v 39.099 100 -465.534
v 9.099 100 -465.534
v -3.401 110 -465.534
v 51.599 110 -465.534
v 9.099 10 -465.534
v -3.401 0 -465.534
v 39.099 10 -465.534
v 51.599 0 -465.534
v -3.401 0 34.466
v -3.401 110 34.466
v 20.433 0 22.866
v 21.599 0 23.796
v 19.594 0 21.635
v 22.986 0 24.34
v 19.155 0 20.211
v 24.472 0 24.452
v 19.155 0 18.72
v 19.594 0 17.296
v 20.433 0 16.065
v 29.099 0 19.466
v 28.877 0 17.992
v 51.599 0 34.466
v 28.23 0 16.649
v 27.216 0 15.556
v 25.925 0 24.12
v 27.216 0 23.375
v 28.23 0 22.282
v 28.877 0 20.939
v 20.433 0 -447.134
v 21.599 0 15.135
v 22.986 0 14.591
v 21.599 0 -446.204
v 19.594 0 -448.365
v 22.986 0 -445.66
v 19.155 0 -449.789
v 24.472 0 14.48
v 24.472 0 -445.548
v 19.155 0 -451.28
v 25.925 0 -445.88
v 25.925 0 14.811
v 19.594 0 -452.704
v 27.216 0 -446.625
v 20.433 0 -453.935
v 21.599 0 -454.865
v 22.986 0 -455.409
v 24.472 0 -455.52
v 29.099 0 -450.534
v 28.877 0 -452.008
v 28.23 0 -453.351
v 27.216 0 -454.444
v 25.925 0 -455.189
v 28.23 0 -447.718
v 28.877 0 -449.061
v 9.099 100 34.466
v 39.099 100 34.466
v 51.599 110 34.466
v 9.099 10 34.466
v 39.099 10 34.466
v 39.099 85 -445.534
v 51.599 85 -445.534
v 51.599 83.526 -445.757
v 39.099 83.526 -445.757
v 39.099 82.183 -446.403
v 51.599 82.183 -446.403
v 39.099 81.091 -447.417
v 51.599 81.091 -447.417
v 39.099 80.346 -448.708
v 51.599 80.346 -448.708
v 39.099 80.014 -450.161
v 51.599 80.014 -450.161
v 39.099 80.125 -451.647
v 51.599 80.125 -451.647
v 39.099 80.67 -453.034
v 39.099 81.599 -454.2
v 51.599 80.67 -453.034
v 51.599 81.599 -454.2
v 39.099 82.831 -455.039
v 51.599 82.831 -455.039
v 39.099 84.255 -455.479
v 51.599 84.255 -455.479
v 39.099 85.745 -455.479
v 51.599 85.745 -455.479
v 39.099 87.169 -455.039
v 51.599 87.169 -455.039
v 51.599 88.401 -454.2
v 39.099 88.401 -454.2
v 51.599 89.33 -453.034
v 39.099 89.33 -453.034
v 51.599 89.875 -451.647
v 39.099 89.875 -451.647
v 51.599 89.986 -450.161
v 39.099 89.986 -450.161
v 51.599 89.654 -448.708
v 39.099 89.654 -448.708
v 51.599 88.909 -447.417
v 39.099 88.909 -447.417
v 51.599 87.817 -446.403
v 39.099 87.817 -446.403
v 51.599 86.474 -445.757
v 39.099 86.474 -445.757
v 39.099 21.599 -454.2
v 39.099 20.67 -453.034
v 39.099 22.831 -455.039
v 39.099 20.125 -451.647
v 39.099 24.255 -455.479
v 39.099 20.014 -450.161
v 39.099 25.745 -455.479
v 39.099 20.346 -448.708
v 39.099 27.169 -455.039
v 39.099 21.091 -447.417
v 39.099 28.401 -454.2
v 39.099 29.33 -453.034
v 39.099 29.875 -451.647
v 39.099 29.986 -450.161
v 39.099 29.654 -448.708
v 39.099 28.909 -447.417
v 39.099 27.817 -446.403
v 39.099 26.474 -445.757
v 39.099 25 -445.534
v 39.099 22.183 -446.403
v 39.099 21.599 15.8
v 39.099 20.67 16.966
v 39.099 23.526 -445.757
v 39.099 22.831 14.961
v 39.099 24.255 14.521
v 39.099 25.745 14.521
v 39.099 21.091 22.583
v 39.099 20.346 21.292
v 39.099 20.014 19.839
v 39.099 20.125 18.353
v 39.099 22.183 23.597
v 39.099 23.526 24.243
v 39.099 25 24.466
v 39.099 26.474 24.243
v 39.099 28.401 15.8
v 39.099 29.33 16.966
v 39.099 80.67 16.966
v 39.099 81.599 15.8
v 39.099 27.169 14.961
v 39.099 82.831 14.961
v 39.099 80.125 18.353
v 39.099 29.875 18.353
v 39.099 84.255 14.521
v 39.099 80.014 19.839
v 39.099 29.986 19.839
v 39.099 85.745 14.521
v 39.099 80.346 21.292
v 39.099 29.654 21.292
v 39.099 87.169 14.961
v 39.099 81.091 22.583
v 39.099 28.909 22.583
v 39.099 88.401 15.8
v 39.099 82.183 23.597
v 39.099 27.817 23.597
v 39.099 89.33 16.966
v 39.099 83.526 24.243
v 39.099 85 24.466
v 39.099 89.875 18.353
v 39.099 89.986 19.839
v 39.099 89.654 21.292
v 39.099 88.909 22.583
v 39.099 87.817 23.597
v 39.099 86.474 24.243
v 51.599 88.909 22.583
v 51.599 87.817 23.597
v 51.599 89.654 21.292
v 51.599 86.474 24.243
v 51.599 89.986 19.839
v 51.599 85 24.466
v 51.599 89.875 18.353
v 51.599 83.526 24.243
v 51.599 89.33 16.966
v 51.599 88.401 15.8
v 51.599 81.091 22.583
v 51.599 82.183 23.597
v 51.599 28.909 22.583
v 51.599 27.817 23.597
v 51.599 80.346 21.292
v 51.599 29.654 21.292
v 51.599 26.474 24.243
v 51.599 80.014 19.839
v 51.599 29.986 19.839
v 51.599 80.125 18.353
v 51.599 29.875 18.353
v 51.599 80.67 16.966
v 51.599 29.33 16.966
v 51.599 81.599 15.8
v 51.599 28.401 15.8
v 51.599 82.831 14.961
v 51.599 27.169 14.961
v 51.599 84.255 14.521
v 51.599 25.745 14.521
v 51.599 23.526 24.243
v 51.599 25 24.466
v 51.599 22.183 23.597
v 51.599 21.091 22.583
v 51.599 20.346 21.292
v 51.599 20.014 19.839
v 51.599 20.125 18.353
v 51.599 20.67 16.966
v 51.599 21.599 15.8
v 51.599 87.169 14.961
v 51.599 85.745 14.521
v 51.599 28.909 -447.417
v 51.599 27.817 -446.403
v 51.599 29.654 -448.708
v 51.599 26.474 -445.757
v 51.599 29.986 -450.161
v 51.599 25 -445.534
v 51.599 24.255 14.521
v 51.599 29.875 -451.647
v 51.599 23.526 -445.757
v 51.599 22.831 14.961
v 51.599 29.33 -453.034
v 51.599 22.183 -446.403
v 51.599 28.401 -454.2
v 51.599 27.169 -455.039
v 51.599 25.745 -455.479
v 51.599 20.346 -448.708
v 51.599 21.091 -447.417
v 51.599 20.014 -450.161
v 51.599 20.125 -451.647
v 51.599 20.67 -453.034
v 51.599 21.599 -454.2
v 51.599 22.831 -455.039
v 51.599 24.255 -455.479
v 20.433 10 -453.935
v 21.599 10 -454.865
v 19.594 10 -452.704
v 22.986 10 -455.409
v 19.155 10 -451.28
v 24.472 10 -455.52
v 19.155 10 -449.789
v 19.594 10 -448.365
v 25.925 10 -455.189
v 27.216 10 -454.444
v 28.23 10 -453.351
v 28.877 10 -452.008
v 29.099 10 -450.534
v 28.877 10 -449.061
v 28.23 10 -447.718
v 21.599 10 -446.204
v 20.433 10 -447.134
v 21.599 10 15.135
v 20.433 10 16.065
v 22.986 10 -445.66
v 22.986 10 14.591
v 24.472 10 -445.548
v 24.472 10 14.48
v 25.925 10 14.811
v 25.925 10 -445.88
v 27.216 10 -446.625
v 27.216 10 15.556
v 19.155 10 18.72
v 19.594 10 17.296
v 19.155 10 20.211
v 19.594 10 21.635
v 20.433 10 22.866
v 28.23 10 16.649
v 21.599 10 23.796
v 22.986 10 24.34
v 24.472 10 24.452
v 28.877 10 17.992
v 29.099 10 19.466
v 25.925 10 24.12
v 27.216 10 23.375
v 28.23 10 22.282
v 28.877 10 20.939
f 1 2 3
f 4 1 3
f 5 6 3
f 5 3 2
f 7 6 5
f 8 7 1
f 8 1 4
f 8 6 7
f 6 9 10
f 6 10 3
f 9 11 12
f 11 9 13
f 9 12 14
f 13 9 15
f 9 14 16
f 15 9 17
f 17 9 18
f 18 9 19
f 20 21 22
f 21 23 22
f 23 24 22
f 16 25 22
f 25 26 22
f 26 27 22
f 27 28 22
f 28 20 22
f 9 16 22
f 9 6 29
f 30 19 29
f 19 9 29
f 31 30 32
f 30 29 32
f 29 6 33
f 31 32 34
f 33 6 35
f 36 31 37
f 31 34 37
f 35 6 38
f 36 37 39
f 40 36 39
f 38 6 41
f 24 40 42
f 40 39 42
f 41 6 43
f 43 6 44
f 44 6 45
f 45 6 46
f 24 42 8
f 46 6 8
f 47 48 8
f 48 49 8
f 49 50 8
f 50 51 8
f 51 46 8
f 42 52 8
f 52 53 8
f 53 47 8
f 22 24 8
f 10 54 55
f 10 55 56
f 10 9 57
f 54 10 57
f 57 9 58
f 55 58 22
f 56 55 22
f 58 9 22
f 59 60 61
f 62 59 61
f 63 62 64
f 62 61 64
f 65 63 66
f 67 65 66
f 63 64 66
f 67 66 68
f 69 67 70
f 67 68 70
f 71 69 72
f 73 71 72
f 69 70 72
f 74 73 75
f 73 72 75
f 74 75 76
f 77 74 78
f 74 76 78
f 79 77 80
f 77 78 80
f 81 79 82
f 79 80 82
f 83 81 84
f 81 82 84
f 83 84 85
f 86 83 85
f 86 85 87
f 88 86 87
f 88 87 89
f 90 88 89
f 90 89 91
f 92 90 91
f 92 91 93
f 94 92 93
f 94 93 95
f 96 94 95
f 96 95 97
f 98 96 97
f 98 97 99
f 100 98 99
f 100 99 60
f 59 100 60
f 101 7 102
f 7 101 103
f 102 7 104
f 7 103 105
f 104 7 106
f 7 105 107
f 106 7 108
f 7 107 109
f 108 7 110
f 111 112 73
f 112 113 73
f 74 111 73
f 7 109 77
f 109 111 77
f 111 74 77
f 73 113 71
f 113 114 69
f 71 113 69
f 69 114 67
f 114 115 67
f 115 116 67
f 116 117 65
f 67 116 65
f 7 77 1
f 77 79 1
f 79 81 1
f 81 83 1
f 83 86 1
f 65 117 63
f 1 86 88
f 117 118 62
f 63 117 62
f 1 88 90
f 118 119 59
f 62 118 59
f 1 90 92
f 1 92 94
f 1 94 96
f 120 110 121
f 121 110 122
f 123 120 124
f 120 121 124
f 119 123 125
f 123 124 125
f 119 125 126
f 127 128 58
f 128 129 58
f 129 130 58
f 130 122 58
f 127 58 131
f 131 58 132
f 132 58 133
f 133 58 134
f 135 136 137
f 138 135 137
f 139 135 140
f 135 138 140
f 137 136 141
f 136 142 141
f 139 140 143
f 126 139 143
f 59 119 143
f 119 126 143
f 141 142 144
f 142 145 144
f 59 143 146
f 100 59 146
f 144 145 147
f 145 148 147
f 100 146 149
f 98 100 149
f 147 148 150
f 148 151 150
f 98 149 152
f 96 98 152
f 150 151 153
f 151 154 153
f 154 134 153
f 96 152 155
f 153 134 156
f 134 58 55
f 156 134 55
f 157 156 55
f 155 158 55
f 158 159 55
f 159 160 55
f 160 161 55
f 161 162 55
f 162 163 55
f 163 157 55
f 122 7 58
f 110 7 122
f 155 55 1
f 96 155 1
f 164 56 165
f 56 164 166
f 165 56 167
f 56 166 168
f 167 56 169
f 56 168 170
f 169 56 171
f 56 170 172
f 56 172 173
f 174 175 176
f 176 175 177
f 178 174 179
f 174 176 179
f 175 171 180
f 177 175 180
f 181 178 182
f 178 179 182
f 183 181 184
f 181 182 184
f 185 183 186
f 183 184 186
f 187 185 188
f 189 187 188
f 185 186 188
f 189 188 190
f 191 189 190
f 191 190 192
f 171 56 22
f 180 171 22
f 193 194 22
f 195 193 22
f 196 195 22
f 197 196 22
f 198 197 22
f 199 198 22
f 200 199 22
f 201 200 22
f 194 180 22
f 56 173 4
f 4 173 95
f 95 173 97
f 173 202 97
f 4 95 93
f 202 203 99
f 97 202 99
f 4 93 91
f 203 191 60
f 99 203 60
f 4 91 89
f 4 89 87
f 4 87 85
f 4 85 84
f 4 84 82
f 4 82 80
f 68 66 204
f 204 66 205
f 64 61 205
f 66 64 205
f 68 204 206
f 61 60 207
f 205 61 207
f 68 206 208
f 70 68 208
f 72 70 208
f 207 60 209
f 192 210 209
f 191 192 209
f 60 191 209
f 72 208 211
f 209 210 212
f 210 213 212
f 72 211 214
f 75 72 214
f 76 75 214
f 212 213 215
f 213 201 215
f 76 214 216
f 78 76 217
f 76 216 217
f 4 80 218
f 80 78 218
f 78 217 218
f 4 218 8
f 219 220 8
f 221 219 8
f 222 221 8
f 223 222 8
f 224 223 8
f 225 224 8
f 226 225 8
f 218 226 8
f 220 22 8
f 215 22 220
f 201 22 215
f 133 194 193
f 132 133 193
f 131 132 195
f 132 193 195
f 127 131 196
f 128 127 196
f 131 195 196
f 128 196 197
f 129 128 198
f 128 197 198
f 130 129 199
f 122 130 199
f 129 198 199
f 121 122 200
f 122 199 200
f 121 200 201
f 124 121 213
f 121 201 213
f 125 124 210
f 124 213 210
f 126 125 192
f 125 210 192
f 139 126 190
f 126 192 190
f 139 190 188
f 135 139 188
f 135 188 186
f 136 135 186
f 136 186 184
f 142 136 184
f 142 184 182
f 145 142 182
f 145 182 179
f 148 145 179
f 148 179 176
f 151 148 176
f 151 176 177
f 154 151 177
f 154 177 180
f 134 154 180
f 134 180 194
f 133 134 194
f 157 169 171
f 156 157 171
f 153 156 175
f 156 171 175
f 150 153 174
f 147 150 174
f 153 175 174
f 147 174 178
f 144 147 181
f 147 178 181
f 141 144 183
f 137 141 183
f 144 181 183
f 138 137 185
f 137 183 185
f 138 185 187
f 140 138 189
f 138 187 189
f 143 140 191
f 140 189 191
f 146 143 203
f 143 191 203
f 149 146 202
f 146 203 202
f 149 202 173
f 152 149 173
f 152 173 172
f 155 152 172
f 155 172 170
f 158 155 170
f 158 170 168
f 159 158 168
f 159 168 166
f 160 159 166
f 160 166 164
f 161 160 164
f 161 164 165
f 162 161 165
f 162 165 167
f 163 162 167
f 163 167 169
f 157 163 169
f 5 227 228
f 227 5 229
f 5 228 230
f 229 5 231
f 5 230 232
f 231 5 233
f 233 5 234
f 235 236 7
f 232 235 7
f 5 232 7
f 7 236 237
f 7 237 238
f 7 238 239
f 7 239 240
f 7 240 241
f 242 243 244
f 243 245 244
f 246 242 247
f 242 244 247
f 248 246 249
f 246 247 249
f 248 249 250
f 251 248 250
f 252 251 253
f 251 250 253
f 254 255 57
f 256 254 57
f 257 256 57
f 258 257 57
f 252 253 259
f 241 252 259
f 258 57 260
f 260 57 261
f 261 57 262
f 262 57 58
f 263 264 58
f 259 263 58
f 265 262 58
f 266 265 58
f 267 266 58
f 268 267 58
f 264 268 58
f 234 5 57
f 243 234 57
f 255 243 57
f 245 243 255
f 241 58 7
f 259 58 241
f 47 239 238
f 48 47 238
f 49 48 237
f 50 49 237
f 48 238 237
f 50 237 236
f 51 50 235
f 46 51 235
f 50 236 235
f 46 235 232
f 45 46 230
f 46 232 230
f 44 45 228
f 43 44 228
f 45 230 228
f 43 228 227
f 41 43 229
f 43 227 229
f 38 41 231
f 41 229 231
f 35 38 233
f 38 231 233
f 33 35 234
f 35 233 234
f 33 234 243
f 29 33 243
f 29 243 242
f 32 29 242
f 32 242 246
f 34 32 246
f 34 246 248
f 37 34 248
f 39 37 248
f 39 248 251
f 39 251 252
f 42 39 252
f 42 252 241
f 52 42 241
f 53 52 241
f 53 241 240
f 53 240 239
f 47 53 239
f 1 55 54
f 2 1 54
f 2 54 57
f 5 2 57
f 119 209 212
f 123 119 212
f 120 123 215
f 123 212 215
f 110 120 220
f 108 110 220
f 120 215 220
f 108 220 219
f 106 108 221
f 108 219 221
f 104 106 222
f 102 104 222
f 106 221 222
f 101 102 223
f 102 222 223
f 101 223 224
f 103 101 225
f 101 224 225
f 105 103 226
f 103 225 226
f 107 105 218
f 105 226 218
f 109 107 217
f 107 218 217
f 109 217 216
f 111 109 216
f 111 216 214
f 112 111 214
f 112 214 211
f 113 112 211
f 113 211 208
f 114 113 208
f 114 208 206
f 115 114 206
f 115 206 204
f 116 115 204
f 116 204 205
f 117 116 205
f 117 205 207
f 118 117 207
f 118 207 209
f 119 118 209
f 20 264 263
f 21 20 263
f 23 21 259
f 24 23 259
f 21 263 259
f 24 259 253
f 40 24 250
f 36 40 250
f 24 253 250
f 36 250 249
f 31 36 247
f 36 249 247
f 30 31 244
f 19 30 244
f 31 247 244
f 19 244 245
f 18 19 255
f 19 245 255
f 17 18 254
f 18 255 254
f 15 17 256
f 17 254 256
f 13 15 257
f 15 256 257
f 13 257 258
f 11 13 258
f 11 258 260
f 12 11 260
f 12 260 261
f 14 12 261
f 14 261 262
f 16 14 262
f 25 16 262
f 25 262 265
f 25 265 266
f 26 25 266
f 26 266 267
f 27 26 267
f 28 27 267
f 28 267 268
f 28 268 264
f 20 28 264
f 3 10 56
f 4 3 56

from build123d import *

# Parameters (mm, degrees)
SKETCH1_W                                  = 55
SKETCH1_H                                  = 500
BOSS_EXTRUDE1_DEPTH                        = 110
SKETCH2_W                                  = 15
SKETCH2_H                                  = 45
CUT_EXTRUDE1_DEPTH                         = 500
M10X1_0_TAPPED_HOLE1_D                     = 9
M10X1_0_TAPPED_HOLE1_DEPTH                 = 23
M10X1_0_TAPPED_HOLE1_CBORE_D               = 10
M10X1_0_TAPPED_HOLE1_CBORE_DEPTH           = 20
M10X1_0_TAPPED_HOLE1_TIP                   = 2.703872786
M10X1_0_TAPPED_HOLE2_D                     = 9
M10X1_0_TAPPED_HOLE2_DEPTH                 = 23
M10X1_0_TAPPED_HOLE2_CBORE_D               = 10
M10X1_0_TAPPED_HOLE2_CBORE_DEPTH           = 20
M10X1_0_TAPPED_HOLE2_TIP                   = 2.703872786
M10X1_0_TAPPED_HOLE2_ON_FACE_2_D           = 9
M10X1_0_TAPPED_HOLE2_ON_FACE_2_DEPTH       = 23
M10X1_0_TAPPED_HOLE2_ON_FACE_2_CBORE_D     = 10
M10X1_0_TAPPED_HOLE2_ON_FACE_2_CBORE_DEPTH = 20
M10X1_0_TAPPED_HOLE2_ON_FACE_2_TIP         = 2.703872786


with BuildPart() as part:
    # Sketch1 → Boss-Extrude1 (new body)
    with BuildSketch(Plane(origin=(0, 0, 0), x_dir=(1, 0, 0), z_dir=(0, 1, 0))):
        with Locations((24.098703387, 215.534456811)):
            Rectangle(SKETCH1_W, SKETCH1_H)
    extrude(amount=BOSS_EXTRUDE1_DEPTH)

    # Sketch2 → Cut-Extrude1 (cut)
    with BuildSketch(Plane.XY.offset(34.465543189)):
        with Locations((16.598703387, 77.5)):
            Rectangle(SKETCH2_W, SKETCH2_H)
        with Locations((31.598703387, 77.5)):
            Rectangle(SKETCH2_W, SKETCH2_H)
        with Locations((31.598703387, 32.5)):
            Rectangle(SKETCH2_W, SKETCH2_H)
        with Locations((16.598703387, 32.5)):
            Rectangle(SKETCH2_W, SKETCH2_H)
    extrude(amount=-CUT_EXTRUDE1_DEPTH, mode=Mode.SUBTRACT)

    # M10x1.0 Tapped Hole1
    with Locations(Plane(origin=(0, 10, 0), x_dir=(1, 0, 0), z_dir=(0, 1, 0))):
        with Locations((24.098703387, 450.534456811), (24.098703387, -19.465543189)):
            CounterBoreHole(M10X1_0_TAPPED_HOLE1_D / 2, M10X1_0_TAPPED_HOLE1_CBORE_D / 2, M10X1_0_TAPPED_HOLE1_CBORE_DEPTH, depth=M10X1_0_TAPPED_HOLE1_DEPTH)
            with Locations((0, 0, -(M10X1_0_TAPPED_HOLE1_DEPTH + M10X1_0_TAPPED_HOLE1_TIP / 2))):  # 118° drill point
                Cone(0, M10X1_0_TAPPED_HOLE1_D / 2, M10X1_0_TAPPED_HOLE1_TIP, mode=Mode.SUBTRACT)

    # M10x1.0 Tapped Hole2
    with Locations(Plane(origin=(51.598703387, 85, -450.534456811), x_dir=(0, 0, 1), z_dir=(1, 0, 0))):
        with Locations((0, 0), (0, 60), (470, 0), (470, 60)):
            CounterBoreHole(M10X1_0_TAPPED_HOLE2_D / 2, M10X1_0_TAPPED_HOLE2_CBORE_D / 2, M10X1_0_TAPPED_HOLE2_CBORE_DEPTH, depth=M10X1_0_TAPPED_HOLE2_DEPTH)
            with Locations((0, 0, -(M10X1_0_TAPPED_HOLE2_DEPTH + M10X1_0_TAPPED_HOLE2_TIP / 2))):  # 118° drill point
                Cone(0, M10X1_0_TAPPED_HOLE2_D / 2, M10X1_0_TAPPED_HOLE2_TIP, mode=Mode.SUBTRACT)

    # M10x1.0 Tapped Hole2 on face 2
    with Locations(Plane(origin=(233.947763792, 74.109982143, 0), x_dir=(0, 0, 1), z_dir=(1, 0, 0))):
        with Locations((0, 0)):
            CounterBoreHole(M10X1_0_TAPPED_HOLE2_ON_FACE_2_D / 2, M10X1_0_TAPPED_HOLE2_ON_FACE_2_CBORE_D / 2, M10X1_0_TAPPED_HOLE2_ON_FACE_2_CBORE_DEPTH, depth=M10X1_0_TAPPED_HOLE2_ON_FACE_2_DEPTH)
            with Locations((0, 0, -(M10X1_0_TAPPED_HOLE2_ON_FACE_2_DEPTH + M10X1_0_TAPPED_HOLE2_ON_FACE_2_TIP / 2))):  # 118° drill point
                Cone(0, M10X1_0_TAPPED_HOLE2_ON_FACE_2_D / 2, M10X1_0_TAPPED_HOLE2_ON_FACE_2_TIP, mode=Mode.SUBTRACT)


solid = part.part
